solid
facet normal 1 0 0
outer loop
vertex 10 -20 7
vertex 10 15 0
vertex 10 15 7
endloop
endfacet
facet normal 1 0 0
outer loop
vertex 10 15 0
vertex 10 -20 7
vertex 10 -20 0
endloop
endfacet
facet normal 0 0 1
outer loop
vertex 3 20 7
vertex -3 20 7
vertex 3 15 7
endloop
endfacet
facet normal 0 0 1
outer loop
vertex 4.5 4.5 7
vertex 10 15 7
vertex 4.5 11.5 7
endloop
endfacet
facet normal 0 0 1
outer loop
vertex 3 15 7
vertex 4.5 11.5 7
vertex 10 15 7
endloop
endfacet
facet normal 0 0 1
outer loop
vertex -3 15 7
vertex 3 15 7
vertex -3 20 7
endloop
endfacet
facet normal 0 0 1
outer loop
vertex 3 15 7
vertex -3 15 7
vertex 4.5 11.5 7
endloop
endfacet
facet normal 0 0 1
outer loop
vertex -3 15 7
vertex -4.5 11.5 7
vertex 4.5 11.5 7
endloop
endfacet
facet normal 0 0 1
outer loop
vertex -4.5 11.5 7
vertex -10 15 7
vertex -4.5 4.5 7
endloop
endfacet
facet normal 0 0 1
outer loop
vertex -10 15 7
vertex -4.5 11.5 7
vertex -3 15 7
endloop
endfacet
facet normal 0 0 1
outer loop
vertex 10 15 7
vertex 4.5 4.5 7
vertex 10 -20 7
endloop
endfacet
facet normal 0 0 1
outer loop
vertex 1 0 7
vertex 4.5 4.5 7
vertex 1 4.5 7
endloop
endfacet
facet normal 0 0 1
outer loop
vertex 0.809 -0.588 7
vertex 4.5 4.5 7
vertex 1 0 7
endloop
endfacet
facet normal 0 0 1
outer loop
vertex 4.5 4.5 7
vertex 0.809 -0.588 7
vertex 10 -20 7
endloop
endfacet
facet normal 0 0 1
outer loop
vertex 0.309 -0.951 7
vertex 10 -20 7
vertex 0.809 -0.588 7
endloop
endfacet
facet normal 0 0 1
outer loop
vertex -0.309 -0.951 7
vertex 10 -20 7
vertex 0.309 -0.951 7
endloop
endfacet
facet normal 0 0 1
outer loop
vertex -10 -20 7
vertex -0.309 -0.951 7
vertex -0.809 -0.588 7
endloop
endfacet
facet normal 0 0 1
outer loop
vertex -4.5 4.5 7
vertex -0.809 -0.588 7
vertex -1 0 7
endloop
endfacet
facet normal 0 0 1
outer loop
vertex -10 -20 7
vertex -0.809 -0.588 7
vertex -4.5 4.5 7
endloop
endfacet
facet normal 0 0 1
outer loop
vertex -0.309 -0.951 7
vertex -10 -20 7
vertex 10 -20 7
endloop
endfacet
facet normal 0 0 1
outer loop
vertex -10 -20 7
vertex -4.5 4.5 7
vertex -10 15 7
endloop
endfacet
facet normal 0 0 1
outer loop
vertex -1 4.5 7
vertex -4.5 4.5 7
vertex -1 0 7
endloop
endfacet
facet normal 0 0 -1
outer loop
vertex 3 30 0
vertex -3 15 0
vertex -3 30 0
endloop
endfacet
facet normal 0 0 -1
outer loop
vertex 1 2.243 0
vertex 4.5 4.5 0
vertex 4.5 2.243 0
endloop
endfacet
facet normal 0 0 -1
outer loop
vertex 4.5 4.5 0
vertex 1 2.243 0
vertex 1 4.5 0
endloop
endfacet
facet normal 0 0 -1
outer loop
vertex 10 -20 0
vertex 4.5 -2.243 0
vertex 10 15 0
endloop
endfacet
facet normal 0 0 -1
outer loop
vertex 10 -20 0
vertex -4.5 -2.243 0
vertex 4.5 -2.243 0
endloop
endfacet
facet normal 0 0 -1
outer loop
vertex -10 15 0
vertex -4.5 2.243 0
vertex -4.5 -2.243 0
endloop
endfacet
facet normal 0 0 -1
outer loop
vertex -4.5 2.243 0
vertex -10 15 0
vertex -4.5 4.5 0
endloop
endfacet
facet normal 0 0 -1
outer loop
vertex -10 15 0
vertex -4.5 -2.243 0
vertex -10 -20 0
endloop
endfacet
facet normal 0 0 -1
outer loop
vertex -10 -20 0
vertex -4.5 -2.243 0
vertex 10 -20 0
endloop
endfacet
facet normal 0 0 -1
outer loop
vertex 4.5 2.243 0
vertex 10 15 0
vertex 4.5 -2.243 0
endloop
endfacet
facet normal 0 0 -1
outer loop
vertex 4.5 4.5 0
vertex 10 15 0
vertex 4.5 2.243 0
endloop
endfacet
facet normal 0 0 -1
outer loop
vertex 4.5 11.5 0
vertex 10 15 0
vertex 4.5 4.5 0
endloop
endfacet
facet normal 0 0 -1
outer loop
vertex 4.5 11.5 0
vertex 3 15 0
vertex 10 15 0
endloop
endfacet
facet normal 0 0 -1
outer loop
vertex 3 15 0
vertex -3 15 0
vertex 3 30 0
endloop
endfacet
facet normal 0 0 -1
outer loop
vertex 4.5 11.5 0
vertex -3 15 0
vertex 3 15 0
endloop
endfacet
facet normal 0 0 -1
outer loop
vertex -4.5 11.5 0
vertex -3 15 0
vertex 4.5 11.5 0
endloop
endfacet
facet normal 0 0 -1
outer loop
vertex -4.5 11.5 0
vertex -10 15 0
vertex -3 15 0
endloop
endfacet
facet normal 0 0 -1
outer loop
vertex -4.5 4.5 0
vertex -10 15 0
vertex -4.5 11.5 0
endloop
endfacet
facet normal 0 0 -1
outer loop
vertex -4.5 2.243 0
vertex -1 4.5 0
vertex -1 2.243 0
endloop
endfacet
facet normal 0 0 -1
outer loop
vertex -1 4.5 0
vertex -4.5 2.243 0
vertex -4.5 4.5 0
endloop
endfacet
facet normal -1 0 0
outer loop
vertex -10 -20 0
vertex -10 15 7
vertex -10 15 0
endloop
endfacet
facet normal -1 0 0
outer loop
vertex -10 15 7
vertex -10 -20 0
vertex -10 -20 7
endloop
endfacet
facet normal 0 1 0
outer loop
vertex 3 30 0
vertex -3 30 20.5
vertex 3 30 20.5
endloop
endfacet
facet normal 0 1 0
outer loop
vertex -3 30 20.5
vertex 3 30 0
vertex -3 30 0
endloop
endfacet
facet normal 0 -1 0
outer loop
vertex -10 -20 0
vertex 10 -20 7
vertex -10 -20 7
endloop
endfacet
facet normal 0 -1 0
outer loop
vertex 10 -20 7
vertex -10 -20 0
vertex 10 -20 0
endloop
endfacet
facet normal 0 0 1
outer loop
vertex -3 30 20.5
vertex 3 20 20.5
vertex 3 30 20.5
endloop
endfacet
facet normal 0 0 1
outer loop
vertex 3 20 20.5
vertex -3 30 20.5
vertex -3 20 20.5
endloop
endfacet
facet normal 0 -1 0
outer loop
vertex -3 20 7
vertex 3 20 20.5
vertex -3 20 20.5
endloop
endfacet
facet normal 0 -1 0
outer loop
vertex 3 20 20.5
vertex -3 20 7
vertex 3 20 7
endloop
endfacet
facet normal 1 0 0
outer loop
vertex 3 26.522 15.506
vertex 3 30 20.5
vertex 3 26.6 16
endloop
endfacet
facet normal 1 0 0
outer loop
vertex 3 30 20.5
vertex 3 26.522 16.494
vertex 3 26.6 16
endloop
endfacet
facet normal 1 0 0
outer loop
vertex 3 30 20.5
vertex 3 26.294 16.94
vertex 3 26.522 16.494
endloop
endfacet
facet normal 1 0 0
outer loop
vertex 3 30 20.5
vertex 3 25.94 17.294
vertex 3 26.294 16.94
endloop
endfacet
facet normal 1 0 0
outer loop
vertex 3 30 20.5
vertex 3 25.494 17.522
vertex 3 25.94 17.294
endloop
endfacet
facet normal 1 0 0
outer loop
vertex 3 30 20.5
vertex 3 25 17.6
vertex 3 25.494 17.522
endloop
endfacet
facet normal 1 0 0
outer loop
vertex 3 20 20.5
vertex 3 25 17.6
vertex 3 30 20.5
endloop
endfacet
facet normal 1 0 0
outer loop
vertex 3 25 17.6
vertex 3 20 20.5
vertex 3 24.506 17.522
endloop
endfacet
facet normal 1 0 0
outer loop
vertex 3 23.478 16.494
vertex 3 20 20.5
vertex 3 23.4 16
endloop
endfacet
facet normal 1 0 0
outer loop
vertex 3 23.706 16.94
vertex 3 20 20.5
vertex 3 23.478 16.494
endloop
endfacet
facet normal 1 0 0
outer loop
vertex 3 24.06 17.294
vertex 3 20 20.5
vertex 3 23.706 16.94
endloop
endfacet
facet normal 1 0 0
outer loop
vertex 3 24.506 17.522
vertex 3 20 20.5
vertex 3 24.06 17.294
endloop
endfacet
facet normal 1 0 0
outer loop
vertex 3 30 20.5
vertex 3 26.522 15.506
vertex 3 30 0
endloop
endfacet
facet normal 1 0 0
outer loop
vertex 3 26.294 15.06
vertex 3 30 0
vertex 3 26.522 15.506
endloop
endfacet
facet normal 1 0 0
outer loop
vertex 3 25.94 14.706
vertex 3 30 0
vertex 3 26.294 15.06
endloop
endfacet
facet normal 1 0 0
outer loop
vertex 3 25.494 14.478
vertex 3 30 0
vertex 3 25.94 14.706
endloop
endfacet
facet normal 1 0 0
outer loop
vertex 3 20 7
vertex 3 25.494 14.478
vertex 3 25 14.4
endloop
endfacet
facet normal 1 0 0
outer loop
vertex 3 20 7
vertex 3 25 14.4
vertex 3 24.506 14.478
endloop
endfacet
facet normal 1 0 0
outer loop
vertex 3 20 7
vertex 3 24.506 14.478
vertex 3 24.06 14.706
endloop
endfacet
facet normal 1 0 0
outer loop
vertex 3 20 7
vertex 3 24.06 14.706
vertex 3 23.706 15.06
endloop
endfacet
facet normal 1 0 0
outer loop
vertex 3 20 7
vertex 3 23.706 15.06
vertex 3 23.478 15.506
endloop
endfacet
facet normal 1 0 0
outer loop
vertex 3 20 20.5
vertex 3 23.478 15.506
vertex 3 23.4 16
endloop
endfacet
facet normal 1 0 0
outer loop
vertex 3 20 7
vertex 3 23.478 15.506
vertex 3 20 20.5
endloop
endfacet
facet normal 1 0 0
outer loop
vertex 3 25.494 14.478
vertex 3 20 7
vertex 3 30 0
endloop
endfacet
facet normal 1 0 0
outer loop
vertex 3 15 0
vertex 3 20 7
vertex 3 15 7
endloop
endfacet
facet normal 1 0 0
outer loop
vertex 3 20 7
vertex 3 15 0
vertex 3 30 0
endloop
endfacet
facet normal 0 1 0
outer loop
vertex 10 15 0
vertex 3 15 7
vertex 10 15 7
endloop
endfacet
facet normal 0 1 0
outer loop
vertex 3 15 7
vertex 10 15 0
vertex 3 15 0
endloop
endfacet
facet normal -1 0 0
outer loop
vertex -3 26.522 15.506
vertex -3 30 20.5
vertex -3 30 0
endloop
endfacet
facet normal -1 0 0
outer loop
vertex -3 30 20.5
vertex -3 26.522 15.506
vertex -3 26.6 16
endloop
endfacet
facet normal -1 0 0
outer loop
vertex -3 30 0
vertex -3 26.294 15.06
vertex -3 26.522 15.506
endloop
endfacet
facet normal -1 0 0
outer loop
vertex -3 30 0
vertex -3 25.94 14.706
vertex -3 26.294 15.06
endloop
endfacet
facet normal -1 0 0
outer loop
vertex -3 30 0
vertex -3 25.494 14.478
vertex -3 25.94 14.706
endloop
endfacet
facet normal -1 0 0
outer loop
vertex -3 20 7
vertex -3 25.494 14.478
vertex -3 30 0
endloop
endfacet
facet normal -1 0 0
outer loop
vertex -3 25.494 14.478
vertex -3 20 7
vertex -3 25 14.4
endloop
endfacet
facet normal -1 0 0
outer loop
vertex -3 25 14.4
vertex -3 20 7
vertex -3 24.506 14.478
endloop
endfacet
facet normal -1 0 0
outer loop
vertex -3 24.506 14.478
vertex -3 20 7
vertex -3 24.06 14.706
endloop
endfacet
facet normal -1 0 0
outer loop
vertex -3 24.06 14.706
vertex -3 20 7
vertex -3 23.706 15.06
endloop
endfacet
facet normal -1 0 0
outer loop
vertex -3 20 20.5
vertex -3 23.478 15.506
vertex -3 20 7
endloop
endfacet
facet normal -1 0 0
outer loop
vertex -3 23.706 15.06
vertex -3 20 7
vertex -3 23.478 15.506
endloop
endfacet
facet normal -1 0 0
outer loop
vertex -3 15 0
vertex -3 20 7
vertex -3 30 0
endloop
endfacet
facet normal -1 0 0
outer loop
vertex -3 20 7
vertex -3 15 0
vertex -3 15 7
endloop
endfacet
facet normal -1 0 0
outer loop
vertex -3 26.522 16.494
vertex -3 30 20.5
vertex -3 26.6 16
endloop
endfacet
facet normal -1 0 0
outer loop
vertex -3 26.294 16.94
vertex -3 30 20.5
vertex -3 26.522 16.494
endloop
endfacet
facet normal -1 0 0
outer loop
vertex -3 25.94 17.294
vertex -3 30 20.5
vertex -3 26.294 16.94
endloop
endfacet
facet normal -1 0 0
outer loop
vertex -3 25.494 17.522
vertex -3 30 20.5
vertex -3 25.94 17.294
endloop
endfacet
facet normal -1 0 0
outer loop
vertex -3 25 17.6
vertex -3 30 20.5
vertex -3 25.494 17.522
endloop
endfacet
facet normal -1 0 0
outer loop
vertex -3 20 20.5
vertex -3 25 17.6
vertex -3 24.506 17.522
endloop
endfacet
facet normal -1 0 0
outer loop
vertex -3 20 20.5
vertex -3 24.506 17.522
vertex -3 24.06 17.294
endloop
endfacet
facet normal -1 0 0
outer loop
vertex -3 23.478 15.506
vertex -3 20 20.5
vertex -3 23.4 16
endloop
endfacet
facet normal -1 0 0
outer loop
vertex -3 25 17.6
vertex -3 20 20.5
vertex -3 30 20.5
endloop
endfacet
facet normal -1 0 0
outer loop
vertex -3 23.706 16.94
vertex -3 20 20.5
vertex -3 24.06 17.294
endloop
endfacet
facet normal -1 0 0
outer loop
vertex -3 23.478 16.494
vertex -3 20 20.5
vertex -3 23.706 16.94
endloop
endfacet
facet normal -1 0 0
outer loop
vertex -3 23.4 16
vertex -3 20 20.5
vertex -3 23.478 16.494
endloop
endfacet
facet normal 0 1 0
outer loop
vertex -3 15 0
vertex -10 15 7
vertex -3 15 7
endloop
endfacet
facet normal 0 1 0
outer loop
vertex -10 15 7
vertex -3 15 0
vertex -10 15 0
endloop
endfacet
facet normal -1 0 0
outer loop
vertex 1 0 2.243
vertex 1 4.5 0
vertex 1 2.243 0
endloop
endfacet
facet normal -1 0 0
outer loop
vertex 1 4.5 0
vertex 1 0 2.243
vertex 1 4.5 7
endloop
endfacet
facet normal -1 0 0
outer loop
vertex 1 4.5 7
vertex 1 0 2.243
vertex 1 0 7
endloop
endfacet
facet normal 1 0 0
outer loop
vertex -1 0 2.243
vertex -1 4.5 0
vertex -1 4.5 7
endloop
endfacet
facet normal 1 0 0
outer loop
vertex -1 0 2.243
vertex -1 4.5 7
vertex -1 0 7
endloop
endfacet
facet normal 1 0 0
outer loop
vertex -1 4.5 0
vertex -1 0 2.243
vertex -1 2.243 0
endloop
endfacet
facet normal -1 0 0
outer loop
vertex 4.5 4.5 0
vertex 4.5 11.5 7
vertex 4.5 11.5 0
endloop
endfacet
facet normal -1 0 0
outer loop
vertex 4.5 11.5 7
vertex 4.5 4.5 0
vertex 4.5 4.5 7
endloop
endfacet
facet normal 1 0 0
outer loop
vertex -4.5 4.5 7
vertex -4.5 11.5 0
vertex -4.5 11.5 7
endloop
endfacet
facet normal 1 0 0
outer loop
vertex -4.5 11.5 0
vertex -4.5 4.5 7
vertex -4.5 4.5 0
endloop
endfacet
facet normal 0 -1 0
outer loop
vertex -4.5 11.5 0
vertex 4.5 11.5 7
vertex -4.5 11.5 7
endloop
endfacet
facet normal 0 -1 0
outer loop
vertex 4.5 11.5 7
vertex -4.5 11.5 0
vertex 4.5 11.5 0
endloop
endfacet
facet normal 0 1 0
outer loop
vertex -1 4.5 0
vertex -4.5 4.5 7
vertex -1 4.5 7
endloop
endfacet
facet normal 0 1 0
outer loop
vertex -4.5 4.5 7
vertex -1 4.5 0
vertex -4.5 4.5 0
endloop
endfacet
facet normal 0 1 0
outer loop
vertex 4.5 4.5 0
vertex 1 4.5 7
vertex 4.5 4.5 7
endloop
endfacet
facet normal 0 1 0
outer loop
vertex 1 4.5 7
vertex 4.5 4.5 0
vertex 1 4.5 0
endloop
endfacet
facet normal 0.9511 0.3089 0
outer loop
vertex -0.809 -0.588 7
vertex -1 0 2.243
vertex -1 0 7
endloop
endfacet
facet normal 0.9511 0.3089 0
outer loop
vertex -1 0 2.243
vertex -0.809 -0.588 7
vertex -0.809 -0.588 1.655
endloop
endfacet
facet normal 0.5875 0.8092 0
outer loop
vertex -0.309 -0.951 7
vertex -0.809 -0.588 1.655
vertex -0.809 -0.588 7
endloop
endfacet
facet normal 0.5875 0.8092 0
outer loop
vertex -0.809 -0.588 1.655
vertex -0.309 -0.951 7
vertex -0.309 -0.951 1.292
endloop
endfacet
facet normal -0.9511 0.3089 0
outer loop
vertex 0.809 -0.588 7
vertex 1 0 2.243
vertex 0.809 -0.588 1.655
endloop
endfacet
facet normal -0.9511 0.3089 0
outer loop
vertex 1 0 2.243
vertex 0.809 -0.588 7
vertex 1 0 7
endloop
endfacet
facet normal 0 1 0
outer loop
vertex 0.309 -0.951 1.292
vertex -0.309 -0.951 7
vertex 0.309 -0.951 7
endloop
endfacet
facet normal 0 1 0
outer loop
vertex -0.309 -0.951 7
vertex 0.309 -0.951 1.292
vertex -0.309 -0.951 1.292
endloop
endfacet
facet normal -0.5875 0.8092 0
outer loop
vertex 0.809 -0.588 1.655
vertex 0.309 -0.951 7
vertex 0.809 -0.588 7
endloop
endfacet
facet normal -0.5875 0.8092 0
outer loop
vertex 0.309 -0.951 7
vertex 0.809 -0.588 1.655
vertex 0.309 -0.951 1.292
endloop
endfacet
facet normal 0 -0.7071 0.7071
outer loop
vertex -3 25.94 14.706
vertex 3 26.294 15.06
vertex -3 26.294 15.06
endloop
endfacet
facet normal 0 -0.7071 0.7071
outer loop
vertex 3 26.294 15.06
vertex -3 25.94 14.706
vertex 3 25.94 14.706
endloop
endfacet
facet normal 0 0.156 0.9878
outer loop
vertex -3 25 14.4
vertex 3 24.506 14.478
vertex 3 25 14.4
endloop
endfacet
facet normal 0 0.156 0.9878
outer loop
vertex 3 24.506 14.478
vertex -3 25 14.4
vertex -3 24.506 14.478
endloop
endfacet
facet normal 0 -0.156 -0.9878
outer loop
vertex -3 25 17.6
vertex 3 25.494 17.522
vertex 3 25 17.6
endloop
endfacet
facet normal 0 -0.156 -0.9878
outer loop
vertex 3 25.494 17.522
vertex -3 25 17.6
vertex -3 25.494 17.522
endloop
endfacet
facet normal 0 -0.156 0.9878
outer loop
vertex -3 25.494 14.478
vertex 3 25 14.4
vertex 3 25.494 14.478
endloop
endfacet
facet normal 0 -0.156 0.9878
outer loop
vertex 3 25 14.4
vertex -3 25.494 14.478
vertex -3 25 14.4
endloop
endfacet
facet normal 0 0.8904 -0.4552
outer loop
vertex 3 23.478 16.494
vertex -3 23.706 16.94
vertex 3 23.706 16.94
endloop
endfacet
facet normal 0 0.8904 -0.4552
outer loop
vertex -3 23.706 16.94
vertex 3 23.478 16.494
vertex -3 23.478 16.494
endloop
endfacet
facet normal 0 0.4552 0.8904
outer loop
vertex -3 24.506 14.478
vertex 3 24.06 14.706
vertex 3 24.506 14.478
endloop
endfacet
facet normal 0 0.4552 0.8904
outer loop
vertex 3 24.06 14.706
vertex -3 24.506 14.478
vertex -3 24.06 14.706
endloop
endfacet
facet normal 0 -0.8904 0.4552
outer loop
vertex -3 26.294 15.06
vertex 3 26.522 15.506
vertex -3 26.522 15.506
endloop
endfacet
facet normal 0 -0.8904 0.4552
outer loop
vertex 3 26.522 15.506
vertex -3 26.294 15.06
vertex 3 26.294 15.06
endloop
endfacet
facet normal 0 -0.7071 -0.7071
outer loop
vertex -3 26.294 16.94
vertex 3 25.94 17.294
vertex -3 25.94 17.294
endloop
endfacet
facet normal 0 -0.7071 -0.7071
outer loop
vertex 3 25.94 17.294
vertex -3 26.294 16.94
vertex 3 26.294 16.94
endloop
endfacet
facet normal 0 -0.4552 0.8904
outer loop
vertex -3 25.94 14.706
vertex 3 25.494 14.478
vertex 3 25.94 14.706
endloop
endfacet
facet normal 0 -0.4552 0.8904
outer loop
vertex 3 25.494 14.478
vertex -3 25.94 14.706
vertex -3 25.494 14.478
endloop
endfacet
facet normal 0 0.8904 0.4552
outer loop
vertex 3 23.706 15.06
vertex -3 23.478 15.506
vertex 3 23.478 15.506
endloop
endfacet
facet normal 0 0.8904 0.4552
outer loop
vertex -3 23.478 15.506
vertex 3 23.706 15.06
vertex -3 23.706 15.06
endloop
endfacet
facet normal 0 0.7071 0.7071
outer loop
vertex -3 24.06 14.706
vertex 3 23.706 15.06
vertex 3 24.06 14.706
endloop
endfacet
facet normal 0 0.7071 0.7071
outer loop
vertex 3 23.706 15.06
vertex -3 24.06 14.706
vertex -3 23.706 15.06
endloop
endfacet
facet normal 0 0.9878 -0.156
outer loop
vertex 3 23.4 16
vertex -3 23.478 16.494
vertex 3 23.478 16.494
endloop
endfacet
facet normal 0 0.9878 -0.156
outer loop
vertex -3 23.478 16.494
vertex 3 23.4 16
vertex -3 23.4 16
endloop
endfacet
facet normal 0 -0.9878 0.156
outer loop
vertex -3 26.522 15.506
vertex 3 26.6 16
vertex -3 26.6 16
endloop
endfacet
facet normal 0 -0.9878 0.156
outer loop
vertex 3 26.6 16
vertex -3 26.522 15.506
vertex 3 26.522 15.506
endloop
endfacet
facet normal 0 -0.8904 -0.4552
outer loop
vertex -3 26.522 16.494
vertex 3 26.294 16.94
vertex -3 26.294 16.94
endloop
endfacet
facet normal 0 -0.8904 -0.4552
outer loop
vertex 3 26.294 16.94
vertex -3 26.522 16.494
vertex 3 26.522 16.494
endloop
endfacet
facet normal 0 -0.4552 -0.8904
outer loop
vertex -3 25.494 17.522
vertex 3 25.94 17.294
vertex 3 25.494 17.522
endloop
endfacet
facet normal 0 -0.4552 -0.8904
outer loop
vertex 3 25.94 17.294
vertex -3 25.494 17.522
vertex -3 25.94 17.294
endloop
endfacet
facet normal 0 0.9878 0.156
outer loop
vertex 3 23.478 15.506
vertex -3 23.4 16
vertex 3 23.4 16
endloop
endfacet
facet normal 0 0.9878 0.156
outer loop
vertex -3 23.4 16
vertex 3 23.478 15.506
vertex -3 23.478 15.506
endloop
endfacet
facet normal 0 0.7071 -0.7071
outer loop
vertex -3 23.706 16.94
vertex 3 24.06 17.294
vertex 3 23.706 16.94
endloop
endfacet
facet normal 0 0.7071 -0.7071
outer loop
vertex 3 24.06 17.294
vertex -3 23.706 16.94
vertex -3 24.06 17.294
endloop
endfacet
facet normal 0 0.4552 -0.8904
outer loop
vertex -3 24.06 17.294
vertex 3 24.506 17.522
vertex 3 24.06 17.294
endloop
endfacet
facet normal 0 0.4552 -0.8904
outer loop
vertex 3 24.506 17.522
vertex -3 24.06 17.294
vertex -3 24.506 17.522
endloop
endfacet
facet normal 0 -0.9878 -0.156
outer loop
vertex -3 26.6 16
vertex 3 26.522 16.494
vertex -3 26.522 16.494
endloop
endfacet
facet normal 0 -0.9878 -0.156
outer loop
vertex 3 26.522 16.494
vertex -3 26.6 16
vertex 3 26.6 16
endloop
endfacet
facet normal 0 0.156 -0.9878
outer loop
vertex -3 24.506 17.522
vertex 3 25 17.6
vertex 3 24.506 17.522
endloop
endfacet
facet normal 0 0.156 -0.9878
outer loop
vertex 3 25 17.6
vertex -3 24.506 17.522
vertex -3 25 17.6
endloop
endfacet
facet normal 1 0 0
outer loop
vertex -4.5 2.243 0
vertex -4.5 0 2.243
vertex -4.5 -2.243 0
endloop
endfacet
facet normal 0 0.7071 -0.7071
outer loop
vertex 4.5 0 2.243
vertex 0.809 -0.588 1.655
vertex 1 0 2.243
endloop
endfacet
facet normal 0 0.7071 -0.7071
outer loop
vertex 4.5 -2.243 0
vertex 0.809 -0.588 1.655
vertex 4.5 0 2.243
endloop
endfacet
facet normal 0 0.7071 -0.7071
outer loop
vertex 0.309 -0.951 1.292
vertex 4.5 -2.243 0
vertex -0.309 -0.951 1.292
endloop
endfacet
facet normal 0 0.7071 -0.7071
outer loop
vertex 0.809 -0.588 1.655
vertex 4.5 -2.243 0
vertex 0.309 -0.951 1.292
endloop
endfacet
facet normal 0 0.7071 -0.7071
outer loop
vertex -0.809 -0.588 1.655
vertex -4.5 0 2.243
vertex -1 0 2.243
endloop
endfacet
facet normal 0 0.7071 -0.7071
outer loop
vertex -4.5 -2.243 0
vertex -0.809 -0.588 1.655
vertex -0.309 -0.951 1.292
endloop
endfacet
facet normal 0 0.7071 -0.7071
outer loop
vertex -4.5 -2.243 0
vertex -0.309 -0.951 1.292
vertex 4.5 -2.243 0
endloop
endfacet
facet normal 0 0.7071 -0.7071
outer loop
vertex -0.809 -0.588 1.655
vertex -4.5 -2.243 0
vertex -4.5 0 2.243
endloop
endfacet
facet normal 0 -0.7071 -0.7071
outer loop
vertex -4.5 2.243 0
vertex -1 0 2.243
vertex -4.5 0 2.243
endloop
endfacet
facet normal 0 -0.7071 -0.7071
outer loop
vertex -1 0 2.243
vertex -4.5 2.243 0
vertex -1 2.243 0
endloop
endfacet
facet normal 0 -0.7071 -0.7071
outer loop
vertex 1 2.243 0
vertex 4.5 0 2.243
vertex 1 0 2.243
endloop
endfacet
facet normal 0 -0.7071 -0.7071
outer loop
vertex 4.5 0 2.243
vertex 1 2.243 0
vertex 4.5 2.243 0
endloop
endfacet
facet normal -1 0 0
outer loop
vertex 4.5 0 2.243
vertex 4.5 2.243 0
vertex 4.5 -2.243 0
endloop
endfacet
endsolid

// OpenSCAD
module clamp()
{
	difference()
	{
		union()
		{
			translate([0,10,3.5])
				cube([20,40,7],center=true);
			
			translate([0,25,8.5])
				cube([20,10,10],center=true);
			
			translate([0,10,3.5])
				cube([20,40,7],center=true);
			
			translate([0,0,13])
				cylinder(r=6.75, h= 25,center=true,$fn=30);
		}

		translate([9,0,0])
			cube([20,2,57],center=true);
		
		translate([0,26,0])
			cube([8,20,57],center=true);
		
		translate([0,0,28])
			cylinder(r=3.25, h= 20,center=true,$fn=20);
		
		//cylinder(r=1, h= 70,center=true,$fn=10);
		
		translate([0,25,8.5])
			rotate([0,90,0])
				cylinder(r=1.6, h= 40,center=true,$fn=20);
	}
}


module lever()
{
	difference()
	{
		union()
		{
			translate([0,5,3.5])
				cube([20,50,7],center=true);
			translate([0,25,12])
				cube([20,10,17],center=true);
		
		}
		
		translate([13,25,0])
			cube([20,20,50],center=true);
		translate([-13,25,0])
			cube([20,20,50],center=true);
		
		translate([0,5,0])
			cube([2,10,57],center=true);
		
		translate([0,8,0])
			cube([9,7,57],center=true);
		
		cylinder(r=1, h= 70,center=true,$fn=10);
		
		translate([0,25,16])
			rotate([0,90,0])
				cylinder(r=1.6, h= 40,center=true,$fn=20);
		
		translate([0,0,-2])
			rotate([45,0,0])
				cube([9,6,6],center=true);
	}
}



//translate([0,0,-37])
	lever();

//clamp();
